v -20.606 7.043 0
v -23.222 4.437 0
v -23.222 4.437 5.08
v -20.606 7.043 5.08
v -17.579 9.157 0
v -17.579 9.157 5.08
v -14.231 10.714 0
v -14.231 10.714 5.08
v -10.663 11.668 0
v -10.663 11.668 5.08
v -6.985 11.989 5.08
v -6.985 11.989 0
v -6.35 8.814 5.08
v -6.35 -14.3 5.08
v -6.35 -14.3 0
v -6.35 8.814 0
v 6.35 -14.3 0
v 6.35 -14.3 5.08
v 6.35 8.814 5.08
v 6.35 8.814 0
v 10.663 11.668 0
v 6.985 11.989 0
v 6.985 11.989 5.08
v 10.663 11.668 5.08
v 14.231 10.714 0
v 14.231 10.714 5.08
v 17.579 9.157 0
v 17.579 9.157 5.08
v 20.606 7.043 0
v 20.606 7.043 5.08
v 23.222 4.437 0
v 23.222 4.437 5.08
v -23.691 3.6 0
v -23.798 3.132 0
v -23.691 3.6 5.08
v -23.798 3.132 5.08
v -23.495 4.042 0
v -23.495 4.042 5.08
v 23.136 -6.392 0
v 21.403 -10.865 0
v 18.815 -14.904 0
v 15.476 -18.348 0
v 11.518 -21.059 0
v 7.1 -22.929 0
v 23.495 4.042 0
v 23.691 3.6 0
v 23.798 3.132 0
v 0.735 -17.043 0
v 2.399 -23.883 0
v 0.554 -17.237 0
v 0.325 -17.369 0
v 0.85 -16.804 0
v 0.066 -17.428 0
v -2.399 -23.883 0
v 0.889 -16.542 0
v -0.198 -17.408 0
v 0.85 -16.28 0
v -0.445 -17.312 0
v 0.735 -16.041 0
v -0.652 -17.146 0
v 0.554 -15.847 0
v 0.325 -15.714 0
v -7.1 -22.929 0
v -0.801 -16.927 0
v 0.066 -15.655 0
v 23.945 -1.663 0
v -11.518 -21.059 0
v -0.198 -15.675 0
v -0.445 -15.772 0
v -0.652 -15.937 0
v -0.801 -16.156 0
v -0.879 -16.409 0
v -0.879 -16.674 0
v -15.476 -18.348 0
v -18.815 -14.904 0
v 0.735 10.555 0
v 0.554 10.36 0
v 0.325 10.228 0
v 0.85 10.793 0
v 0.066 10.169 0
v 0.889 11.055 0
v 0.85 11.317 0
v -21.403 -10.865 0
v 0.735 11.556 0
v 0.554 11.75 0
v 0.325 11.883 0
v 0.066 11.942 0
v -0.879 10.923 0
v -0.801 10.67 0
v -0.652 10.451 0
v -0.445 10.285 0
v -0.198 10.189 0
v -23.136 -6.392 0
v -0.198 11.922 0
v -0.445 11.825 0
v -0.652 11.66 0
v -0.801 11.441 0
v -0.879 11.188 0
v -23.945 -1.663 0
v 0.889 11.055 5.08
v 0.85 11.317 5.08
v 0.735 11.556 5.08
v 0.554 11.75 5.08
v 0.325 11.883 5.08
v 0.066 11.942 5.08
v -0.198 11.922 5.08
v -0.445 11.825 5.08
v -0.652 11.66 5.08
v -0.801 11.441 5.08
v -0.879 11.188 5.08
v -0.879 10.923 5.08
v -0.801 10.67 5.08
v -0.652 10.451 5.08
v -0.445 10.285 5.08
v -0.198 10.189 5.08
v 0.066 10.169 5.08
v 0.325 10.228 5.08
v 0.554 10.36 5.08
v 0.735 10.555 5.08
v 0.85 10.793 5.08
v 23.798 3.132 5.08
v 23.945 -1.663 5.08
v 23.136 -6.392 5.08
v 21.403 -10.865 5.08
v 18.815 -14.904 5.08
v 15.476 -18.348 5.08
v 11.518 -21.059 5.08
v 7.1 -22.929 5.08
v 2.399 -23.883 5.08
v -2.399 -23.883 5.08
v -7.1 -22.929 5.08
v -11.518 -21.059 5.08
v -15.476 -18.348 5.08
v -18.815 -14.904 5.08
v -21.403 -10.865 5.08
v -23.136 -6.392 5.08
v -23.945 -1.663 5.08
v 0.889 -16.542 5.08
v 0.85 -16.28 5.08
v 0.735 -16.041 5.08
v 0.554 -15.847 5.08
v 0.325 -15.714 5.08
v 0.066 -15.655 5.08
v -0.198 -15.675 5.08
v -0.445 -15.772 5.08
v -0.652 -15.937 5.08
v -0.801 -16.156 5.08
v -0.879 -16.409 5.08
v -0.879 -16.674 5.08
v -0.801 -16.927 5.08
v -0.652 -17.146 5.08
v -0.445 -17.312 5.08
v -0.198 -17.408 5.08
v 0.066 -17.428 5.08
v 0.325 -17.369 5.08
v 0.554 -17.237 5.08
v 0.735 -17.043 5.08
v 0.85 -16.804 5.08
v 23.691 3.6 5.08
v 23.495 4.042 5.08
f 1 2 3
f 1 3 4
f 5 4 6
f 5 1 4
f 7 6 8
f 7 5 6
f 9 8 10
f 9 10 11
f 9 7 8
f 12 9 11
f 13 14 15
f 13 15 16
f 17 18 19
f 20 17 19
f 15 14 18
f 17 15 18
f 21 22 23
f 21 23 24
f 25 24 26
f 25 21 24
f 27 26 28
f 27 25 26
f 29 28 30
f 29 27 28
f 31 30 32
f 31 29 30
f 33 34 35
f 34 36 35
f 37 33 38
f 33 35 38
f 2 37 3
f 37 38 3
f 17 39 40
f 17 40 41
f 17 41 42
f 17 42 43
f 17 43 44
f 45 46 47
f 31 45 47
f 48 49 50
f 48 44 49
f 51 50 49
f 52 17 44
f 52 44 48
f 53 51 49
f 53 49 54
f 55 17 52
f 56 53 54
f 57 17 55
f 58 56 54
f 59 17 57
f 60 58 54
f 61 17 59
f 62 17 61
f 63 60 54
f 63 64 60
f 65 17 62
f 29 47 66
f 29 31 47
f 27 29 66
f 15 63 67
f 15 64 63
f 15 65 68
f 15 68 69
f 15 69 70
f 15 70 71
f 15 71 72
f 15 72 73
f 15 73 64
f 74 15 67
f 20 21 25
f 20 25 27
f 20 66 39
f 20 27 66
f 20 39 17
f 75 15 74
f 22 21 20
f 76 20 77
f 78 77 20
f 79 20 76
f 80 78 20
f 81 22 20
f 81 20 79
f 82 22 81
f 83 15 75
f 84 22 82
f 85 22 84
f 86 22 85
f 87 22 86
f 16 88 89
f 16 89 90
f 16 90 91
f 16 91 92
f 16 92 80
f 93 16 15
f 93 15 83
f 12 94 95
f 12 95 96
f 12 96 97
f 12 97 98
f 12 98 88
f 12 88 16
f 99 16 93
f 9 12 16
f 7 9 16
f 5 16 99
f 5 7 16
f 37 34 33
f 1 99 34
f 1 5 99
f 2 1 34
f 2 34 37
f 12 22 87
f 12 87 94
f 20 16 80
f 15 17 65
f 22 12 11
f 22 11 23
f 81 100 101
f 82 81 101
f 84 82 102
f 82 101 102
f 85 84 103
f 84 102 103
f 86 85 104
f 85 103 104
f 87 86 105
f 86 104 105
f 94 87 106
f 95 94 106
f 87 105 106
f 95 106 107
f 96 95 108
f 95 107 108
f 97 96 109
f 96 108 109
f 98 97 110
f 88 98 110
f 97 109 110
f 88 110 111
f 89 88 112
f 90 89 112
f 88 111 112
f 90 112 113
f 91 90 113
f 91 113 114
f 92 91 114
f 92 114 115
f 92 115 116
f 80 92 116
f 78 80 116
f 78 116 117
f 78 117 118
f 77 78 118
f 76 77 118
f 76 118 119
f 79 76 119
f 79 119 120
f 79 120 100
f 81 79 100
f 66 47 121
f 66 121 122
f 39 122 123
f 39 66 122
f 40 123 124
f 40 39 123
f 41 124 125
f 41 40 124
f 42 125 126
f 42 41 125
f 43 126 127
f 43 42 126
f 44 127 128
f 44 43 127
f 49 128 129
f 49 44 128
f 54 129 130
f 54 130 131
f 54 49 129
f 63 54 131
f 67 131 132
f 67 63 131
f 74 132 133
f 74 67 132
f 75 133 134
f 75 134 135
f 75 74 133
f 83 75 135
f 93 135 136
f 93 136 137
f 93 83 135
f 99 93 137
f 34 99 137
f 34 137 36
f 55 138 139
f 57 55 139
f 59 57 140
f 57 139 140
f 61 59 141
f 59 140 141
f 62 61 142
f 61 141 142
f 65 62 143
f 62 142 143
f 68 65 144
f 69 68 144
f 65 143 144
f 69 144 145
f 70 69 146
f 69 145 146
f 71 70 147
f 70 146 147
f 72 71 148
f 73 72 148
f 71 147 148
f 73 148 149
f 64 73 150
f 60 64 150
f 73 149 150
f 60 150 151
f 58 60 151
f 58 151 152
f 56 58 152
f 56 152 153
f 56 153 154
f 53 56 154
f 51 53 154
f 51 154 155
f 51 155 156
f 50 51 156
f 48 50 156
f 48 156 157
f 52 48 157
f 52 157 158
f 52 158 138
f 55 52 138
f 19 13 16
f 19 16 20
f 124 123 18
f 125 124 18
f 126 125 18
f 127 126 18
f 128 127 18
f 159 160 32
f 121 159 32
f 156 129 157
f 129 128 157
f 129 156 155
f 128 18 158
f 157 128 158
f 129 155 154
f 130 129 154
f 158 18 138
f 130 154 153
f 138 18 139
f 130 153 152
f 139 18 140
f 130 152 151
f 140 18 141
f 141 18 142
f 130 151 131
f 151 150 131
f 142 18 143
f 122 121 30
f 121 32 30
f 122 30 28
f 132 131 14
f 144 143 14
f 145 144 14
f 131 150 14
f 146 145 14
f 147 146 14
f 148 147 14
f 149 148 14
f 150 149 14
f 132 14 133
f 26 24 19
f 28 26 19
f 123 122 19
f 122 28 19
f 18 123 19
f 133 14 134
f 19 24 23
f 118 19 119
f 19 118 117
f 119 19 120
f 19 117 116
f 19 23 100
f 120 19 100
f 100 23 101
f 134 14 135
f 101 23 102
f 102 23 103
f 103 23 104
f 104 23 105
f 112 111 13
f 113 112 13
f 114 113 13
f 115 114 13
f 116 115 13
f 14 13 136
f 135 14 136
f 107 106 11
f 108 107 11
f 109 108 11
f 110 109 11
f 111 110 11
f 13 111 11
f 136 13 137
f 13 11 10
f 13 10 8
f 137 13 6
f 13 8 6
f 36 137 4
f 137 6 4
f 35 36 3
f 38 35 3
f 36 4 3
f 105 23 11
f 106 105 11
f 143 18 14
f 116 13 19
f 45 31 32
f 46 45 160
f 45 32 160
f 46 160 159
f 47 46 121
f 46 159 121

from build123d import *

# Parameters (mm, degrees)
BOSS_EXTRUDE1_DEPTH = 5.08
FILLET1_R           = 2.54
SKETCH5_R           = 0.889
SKETCH5_W           = 12.7
SKETCH5_H           = 23.114
CUT_EXTRUDE1_DEPTH  = 35.323380204


with BuildPart() as part:
    # Sketch1 → Boss-Extrude1 (new body)
    with BuildSketch(Plane.XY):
        with BuildLine():
            Line((-6.985, 11.9888), (6.985, 11.9888))
            ThreePointArc((6.985, 11.9888), (16.273931797, 9.848966937), (23.69046712, 3.8608))
            ThreePointArc((23.69046712, 3.8608), (0, -24.003), (-23.69046712, 3.8608))
            ThreePointArc((-23.69046712, 3.8608), (-16.273931797, 9.848966937), (-6.985, 11.9888))
        make_face()
    extrude(amount=BOSS_EXTRUDE1_DEPTH)

    # Fillet1
    fillet1_edges = [part.edges().sort_by_distance(p)[0] for p in [
        (23.69046712, 3.8608, 2.54),
        (-23.69046712, 3.8608, 2.54),
    ]]
    fillet(fillet1_edges, radius=FILLET1_R)

    # Sketch5 → Cut-Extrude1 (cut, through all)
    with BuildSketch(Plane.XY.offset(5.08)):
        with Locations((0, -16.54175)):
            Circle(SKETCH5_R)
        with Locations((0, 11.05535)):
            Circle(SKETCH5_R)
        with Locations((0, -2.7432)):
            Rectangle(SKETCH5_W, SKETCH5_H)
    extrude(amount=-CUT_EXTRUDE1_DEPTH, mode=Mode.SUBTRACT)


solid = part.part
